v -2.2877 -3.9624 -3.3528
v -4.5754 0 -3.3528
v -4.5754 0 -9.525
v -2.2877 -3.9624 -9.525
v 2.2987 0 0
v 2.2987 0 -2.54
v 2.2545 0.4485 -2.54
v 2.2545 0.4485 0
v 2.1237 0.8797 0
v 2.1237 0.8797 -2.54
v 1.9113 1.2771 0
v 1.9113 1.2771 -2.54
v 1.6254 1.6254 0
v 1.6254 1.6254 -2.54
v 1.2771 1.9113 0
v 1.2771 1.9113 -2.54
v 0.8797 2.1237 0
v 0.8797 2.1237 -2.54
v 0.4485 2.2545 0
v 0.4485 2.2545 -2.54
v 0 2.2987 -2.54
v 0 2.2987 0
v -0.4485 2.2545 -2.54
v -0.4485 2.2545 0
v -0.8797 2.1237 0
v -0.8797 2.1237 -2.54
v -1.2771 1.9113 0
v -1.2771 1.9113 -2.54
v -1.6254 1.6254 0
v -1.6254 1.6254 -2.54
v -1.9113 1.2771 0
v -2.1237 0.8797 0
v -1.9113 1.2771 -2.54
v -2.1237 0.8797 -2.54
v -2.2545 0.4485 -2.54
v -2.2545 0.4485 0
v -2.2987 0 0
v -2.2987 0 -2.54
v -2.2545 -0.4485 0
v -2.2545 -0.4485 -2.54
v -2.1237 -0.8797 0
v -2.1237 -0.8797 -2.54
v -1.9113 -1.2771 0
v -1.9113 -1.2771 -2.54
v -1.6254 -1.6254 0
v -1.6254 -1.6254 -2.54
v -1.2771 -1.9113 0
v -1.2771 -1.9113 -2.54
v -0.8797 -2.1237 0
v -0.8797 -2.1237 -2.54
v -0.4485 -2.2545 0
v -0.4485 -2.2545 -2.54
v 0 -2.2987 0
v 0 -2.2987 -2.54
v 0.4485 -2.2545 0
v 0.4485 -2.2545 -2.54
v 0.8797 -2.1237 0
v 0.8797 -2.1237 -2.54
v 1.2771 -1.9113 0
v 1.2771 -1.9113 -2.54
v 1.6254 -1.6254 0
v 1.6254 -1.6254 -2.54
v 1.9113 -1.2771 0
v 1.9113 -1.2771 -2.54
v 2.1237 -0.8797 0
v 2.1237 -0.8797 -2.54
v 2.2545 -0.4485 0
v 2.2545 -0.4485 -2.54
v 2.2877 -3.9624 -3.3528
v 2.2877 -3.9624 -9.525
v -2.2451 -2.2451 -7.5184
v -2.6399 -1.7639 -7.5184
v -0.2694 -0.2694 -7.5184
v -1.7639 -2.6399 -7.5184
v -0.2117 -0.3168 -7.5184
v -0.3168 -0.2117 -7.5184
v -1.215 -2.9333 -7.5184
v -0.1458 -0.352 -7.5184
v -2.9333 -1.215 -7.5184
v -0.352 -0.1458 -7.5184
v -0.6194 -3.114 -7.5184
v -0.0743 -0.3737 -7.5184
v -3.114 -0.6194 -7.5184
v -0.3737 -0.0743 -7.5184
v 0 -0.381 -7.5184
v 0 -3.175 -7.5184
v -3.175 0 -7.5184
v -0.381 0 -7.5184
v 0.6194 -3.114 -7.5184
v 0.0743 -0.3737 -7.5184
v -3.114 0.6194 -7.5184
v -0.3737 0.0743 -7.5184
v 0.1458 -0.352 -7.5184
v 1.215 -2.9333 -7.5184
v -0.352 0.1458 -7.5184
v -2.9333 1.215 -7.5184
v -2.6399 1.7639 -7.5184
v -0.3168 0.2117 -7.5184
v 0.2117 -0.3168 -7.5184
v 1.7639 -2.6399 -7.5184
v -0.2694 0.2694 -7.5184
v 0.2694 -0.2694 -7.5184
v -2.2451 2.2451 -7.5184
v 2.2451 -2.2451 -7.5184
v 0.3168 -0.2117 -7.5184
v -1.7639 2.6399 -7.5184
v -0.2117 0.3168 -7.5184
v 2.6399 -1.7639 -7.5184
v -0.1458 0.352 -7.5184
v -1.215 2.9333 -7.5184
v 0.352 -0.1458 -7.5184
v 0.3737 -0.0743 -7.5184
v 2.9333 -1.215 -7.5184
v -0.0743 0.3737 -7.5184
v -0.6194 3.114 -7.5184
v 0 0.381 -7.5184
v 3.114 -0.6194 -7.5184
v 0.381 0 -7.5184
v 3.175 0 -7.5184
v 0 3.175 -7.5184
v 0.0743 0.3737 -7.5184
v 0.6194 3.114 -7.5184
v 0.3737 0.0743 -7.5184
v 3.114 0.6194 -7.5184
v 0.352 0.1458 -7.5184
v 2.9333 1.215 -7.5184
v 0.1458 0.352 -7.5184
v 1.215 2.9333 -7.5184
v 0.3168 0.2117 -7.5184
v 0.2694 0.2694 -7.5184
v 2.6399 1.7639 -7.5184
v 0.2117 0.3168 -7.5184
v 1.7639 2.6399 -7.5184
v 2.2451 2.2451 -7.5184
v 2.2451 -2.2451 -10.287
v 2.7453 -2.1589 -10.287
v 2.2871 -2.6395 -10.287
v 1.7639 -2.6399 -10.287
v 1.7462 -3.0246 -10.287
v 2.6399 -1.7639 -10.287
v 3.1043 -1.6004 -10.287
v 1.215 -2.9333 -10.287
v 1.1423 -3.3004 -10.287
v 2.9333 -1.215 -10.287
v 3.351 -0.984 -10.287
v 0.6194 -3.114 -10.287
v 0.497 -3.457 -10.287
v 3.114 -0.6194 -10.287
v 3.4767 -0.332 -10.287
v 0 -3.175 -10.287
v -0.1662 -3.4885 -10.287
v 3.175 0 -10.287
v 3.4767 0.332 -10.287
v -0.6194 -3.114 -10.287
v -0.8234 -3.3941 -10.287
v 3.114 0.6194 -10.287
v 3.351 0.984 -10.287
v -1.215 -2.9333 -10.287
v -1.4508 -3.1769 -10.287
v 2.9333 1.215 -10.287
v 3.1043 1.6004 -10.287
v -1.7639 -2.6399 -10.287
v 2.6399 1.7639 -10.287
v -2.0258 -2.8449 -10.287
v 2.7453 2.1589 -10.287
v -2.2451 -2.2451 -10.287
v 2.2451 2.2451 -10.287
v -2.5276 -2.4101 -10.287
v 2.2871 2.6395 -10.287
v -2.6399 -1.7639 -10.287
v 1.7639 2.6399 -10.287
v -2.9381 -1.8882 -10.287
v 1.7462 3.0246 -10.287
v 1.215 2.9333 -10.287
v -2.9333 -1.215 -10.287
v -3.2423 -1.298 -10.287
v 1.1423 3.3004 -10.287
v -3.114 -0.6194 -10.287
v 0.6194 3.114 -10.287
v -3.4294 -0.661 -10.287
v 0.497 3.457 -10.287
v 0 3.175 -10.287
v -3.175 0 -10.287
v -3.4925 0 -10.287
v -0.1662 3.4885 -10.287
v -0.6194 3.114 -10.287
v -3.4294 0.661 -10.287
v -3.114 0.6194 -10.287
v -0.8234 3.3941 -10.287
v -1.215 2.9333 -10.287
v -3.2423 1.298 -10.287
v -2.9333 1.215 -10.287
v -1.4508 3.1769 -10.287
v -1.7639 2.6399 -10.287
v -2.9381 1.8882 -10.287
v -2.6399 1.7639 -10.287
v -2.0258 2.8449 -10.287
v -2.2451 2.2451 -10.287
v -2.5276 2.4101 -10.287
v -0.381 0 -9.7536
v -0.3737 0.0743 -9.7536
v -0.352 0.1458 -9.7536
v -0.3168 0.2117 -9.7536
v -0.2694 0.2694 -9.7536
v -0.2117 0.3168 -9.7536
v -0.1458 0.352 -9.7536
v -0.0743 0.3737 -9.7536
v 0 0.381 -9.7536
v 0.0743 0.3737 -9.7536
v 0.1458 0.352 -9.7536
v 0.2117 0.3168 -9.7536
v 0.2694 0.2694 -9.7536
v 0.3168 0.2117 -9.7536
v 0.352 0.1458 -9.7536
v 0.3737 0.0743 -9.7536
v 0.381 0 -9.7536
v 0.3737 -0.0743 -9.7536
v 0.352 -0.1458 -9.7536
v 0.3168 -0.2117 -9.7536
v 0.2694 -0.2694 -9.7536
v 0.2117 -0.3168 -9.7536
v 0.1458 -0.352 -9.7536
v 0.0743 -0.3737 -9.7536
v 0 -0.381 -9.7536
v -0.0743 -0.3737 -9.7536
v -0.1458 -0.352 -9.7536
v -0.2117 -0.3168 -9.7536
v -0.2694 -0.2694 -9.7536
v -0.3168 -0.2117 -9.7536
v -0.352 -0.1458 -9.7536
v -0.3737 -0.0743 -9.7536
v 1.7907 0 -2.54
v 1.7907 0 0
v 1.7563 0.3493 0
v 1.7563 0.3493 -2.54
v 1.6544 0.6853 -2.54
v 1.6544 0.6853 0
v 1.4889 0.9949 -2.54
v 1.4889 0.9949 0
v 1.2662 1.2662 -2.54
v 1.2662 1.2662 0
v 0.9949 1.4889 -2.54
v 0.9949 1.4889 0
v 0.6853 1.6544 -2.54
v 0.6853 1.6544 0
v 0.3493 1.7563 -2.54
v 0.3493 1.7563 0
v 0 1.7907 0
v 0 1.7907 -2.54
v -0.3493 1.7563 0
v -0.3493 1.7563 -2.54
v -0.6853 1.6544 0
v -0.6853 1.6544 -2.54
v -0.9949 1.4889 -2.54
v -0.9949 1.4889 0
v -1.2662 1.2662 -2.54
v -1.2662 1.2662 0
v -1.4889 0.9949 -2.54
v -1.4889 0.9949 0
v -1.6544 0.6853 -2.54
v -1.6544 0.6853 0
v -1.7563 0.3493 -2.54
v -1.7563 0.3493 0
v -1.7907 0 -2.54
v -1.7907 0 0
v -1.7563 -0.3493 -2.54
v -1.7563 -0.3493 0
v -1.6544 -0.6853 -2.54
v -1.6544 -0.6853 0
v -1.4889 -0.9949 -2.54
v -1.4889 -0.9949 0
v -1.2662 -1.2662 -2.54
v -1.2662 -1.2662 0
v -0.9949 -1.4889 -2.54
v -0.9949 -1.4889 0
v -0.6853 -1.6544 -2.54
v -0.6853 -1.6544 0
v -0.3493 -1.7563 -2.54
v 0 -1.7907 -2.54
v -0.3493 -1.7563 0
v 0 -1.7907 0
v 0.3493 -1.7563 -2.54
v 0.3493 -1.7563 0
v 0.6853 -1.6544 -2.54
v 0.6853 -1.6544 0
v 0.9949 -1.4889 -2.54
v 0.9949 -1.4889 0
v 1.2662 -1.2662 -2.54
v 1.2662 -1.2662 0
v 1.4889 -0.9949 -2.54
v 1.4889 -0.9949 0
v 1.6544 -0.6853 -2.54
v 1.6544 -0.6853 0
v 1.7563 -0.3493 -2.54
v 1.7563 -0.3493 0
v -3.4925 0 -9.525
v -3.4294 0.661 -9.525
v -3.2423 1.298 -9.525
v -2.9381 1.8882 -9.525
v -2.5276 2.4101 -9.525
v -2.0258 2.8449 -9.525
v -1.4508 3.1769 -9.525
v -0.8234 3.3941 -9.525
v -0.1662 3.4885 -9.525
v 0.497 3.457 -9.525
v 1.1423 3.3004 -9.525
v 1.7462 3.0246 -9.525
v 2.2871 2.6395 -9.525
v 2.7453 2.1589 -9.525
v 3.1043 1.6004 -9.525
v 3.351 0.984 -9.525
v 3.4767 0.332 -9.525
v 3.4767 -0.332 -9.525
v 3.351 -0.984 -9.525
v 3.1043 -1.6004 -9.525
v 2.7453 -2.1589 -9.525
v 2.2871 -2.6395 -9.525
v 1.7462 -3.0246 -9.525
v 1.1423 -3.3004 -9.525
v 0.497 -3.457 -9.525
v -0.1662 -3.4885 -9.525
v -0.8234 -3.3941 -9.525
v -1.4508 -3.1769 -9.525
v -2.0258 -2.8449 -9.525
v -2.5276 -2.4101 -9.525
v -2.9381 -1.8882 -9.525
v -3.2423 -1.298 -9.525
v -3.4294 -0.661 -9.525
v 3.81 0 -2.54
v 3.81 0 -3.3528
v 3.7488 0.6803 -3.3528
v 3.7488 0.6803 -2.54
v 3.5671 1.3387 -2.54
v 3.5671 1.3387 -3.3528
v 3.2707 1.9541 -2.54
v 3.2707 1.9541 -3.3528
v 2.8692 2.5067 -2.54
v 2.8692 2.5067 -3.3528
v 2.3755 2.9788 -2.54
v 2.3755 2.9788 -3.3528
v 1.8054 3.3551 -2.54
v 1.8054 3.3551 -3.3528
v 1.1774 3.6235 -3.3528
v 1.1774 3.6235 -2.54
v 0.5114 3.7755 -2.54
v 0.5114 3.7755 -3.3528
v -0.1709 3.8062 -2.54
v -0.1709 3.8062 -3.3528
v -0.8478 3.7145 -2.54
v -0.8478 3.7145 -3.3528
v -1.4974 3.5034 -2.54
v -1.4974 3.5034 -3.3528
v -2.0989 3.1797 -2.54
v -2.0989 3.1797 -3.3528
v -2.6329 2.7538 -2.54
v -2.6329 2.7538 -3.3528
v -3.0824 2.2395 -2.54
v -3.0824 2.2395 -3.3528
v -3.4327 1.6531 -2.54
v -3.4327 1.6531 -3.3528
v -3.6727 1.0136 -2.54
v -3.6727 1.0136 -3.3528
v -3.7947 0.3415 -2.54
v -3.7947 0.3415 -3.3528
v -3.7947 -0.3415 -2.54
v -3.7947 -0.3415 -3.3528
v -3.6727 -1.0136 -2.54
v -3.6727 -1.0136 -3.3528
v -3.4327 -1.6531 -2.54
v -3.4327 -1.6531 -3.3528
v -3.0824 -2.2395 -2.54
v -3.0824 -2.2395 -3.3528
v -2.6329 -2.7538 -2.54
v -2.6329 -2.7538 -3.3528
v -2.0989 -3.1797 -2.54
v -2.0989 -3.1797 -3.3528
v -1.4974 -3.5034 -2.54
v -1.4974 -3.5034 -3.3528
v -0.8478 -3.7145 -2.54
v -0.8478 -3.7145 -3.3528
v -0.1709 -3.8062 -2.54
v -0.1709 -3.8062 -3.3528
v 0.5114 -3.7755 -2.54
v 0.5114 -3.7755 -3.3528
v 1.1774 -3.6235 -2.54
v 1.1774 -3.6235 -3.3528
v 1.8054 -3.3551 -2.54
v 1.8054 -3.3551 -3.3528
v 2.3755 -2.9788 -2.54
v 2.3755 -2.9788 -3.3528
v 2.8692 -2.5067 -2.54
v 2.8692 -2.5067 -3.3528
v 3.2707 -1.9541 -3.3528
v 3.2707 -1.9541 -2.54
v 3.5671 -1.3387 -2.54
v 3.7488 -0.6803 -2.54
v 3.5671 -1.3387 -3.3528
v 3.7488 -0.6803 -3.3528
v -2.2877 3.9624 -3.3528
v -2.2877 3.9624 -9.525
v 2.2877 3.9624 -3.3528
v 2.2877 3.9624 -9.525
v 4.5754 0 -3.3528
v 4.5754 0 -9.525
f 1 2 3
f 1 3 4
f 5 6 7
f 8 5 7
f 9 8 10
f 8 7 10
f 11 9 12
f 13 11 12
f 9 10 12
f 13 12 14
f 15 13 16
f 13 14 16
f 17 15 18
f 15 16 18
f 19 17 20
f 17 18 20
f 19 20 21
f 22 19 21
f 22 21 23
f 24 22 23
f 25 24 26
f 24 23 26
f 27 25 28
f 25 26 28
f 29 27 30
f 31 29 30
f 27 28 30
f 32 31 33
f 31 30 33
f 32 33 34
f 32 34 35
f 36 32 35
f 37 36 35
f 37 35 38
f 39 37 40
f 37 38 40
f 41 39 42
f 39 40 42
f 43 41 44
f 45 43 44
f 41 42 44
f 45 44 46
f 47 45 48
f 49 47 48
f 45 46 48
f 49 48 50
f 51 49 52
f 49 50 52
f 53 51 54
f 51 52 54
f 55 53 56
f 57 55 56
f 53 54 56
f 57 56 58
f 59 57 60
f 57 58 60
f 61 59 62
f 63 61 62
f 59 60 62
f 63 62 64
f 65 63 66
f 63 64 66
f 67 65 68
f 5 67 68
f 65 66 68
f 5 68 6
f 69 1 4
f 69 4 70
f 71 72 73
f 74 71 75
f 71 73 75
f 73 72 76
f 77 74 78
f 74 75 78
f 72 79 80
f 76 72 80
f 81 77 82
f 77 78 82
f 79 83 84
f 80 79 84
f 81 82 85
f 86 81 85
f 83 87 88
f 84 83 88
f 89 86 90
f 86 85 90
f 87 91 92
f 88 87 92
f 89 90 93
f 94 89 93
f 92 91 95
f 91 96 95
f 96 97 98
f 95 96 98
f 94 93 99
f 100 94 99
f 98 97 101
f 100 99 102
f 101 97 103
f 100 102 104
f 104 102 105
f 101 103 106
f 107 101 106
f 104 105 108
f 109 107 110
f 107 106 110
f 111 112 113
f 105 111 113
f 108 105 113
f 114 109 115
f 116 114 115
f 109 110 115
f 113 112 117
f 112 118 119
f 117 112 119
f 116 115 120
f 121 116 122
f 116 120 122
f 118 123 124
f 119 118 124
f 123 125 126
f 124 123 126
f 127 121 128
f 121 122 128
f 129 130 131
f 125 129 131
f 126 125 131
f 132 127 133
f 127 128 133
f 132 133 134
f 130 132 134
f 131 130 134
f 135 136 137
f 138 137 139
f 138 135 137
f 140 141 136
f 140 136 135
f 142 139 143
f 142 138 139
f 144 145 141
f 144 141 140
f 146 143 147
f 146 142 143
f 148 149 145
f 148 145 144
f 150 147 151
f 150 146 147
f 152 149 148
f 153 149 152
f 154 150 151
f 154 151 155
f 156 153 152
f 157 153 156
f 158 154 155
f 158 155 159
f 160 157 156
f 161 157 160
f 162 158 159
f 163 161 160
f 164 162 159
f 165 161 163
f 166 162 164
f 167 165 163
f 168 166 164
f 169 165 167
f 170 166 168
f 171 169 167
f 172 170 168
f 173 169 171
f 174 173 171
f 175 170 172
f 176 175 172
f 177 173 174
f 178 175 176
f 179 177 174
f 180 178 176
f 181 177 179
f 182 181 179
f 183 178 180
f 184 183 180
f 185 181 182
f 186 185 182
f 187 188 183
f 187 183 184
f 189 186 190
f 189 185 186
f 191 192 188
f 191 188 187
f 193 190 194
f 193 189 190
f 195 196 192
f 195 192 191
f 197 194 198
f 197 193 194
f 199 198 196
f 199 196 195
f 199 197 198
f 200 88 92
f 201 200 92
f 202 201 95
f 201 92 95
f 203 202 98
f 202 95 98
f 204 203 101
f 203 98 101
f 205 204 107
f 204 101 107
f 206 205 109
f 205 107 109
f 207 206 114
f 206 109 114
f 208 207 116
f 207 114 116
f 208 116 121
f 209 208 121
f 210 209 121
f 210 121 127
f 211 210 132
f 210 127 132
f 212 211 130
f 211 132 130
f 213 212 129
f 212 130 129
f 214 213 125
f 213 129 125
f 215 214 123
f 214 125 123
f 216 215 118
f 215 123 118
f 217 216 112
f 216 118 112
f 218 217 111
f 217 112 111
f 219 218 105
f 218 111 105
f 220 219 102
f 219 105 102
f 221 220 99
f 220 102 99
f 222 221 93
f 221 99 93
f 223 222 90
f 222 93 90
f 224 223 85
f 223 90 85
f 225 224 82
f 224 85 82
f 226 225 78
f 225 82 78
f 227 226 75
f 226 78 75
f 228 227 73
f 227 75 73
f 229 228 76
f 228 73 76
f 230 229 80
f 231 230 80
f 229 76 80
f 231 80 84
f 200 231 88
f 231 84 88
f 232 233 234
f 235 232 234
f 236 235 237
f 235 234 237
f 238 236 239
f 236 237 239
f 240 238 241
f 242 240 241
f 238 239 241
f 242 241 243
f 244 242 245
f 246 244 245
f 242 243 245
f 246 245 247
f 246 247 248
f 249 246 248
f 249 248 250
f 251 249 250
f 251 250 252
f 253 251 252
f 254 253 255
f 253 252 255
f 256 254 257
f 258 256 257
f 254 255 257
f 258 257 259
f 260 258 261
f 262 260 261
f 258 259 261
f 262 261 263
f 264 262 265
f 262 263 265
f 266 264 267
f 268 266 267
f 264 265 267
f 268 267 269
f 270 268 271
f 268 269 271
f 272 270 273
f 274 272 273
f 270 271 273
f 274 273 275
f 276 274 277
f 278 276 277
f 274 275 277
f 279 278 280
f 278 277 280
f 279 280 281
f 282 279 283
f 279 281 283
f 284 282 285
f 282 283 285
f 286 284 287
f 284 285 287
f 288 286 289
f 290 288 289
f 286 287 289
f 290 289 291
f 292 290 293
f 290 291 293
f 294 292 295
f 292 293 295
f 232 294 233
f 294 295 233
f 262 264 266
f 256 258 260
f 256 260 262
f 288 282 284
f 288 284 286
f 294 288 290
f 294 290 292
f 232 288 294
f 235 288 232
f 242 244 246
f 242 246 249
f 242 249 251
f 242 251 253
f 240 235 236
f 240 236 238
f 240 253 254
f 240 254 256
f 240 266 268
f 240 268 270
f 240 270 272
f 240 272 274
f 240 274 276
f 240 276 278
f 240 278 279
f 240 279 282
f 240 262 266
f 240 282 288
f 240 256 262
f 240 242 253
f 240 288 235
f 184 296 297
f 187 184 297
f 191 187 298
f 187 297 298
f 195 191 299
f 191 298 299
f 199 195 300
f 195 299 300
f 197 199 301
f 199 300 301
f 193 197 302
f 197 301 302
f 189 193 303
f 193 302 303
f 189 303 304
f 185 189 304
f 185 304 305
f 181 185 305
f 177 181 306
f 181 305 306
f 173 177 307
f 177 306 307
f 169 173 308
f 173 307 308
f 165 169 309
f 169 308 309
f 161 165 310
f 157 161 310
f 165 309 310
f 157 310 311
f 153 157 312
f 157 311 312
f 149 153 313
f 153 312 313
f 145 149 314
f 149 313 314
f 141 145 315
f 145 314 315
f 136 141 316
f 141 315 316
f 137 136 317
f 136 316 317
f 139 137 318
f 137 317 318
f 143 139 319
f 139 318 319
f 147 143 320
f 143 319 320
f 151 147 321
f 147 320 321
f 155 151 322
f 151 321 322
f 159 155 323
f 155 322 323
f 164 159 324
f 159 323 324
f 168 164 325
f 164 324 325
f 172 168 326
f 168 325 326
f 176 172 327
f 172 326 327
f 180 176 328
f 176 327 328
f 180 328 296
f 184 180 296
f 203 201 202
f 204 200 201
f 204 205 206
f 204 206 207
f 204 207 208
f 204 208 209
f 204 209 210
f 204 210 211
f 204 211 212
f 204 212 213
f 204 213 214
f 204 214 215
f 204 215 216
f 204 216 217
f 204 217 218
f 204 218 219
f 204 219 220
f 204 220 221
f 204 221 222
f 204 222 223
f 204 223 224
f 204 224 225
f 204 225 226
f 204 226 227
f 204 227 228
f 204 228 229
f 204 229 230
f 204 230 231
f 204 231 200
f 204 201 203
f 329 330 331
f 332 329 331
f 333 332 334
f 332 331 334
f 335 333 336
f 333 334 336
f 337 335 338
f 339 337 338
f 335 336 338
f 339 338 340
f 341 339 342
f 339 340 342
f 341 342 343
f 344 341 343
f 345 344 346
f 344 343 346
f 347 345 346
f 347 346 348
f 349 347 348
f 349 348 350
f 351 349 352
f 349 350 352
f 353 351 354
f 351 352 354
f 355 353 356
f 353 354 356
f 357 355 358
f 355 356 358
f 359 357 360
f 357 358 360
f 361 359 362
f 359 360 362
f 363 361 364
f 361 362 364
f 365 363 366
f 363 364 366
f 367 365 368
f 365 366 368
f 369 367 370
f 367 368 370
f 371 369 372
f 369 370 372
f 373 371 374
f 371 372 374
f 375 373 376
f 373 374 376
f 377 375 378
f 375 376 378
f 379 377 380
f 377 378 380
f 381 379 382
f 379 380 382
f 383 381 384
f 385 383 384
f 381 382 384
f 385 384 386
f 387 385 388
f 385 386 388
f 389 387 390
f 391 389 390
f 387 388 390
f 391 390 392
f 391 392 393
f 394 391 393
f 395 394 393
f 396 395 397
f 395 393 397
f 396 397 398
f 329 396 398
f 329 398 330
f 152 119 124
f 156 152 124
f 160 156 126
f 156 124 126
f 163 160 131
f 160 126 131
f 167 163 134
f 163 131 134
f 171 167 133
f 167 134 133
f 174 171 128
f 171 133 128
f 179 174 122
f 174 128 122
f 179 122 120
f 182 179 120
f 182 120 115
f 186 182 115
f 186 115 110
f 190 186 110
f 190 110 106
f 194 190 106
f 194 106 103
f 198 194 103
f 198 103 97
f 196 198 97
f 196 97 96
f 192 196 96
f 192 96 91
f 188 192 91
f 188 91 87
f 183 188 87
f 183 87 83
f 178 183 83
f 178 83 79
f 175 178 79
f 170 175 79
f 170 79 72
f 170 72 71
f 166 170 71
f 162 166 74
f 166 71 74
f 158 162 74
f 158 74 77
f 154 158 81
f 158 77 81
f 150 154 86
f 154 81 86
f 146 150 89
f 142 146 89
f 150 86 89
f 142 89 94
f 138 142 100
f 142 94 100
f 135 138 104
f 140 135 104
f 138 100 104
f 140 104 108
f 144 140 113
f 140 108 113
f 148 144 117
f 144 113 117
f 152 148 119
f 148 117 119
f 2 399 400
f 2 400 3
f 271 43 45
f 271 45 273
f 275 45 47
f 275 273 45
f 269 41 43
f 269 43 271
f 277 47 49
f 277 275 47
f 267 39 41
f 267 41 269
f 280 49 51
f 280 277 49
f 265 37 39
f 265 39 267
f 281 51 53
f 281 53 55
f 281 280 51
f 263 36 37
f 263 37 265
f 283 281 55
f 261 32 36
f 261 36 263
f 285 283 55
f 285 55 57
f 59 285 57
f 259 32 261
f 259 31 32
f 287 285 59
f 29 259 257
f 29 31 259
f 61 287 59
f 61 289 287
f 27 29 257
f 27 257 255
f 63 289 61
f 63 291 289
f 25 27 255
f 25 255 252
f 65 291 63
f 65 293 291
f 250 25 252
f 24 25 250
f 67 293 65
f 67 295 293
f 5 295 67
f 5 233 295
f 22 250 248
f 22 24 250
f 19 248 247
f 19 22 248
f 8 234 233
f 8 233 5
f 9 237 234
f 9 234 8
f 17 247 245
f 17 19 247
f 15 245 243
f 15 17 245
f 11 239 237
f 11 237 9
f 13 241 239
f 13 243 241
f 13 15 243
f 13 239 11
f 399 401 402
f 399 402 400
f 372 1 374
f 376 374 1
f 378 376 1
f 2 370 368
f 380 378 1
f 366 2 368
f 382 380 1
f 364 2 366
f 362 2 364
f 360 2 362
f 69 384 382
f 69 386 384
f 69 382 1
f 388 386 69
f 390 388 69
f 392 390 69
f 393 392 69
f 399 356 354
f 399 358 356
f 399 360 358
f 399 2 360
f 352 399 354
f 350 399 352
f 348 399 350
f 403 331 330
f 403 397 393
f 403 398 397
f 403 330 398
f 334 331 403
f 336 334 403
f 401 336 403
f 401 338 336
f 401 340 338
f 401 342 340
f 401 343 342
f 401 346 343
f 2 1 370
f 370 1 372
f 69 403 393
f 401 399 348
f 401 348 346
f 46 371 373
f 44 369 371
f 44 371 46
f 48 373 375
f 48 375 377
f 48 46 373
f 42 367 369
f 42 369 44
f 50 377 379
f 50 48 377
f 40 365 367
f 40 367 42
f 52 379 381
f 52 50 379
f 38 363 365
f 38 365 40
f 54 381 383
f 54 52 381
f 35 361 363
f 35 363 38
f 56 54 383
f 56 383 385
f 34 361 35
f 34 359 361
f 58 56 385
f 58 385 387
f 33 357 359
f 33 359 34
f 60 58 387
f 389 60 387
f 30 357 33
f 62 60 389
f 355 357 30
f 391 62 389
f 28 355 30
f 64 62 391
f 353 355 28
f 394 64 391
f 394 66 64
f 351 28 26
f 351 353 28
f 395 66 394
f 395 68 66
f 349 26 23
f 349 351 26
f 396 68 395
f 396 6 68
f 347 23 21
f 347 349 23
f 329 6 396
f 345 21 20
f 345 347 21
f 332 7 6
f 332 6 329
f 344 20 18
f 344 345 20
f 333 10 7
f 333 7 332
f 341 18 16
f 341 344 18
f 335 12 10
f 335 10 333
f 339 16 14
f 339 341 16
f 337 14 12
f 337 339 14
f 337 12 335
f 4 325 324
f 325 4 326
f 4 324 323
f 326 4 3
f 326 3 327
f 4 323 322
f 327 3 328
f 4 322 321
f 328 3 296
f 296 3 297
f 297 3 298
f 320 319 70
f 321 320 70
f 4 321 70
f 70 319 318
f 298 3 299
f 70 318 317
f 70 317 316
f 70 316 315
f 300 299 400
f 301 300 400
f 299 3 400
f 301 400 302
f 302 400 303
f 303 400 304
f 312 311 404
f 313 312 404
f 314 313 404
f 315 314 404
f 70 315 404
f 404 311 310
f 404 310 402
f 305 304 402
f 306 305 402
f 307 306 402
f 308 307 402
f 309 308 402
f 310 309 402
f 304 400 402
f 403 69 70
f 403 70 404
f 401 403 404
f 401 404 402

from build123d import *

# Parameters (mm, degrees)
EXTRUDE1_DEPTH     = 6.1722
SKETCH2_R          = 3.81
EXTRUDE2_DEPTH     = 0.8128
SKETCH3_R          = 2.2987
EXTRUDE3_DEPTH     = 2.54
SKETCH4_R          = 3.4925
EXTRUDE4_DEPTH     = 0.762
HOLE1_D            = 6.35
HOLE1_DEPTH        = 2.7686
SKETCH7_R          = 0.381
EXTRUDE5_DEPTH     = 2.2352
SKETCH8_R          = 1.7907
CUT_EXTRUDE1_DEPTH = 2.54


with BuildPart() as part:
    # Sketch1 → Extrude1 (new body)
    with BuildSketch(Plane.XY.offset(-3.3528)):
        Polygon((-4.575385413, 0), (-2.287692707, -3.9624), (2.287692707, -3.9624), (4.575385413, 0), (2.287692707, 3.9624), (-2.287692707, 3.9624), align=None)
    extrude(amount=-EXTRUDE1_DEPTH)

    # Sketch2 → Extrude2 (add)
    with BuildSketch(Plane.XY.offset(-3.3528)):
        Circle(SKETCH2_R)
    extrude(amount=EXTRUDE2_DEPTH)

    # Sketch3 → Extrude3 (add)
    with BuildSketch(Plane.XY.offset(-2.54)):
        Circle(SKETCH3_R)
    extrude(amount=EXTRUDE3_DEPTH)

    # Sketch4 → Extrude4 (add)
    with BuildSketch(Plane(origin=(0, 0, -9.525), x_dir=(-1, 0, 0), z_dir=(0, 0, -1))):
        Circle(SKETCH4_R)
    extrude(amount=EXTRUDE4_DEPTH)

    # Hole1
    with Locations(Plane(origin=(0, 0, -10.287), x_dir=(-1, 0, 0), z_dir=(0, 0, -1))):
        with Locations((0, 0)):
            Hole(HOLE1_D / 2, depth=HOLE1_DEPTH)

    # Sketch7 → Extrude5 (add)
    with BuildSketch(Plane(origin=(0, 0, -7.5184), x_dir=(-1, 0, 0), z_dir=(0, 0, -1))):
        Circle(SKETCH7_R)
    extrude(amount=EXTRUDE5_DEPTH)

    # Sketch8 → Cut-Extrude1 (cut)
    with BuildSketch(Plane.XY):
        Circle(SKETCH8_R)
    extrude(amount=-CUT_EXTRUDE1_DEPTH, mode=Mode.SUBTRACT)


solid = part.part
